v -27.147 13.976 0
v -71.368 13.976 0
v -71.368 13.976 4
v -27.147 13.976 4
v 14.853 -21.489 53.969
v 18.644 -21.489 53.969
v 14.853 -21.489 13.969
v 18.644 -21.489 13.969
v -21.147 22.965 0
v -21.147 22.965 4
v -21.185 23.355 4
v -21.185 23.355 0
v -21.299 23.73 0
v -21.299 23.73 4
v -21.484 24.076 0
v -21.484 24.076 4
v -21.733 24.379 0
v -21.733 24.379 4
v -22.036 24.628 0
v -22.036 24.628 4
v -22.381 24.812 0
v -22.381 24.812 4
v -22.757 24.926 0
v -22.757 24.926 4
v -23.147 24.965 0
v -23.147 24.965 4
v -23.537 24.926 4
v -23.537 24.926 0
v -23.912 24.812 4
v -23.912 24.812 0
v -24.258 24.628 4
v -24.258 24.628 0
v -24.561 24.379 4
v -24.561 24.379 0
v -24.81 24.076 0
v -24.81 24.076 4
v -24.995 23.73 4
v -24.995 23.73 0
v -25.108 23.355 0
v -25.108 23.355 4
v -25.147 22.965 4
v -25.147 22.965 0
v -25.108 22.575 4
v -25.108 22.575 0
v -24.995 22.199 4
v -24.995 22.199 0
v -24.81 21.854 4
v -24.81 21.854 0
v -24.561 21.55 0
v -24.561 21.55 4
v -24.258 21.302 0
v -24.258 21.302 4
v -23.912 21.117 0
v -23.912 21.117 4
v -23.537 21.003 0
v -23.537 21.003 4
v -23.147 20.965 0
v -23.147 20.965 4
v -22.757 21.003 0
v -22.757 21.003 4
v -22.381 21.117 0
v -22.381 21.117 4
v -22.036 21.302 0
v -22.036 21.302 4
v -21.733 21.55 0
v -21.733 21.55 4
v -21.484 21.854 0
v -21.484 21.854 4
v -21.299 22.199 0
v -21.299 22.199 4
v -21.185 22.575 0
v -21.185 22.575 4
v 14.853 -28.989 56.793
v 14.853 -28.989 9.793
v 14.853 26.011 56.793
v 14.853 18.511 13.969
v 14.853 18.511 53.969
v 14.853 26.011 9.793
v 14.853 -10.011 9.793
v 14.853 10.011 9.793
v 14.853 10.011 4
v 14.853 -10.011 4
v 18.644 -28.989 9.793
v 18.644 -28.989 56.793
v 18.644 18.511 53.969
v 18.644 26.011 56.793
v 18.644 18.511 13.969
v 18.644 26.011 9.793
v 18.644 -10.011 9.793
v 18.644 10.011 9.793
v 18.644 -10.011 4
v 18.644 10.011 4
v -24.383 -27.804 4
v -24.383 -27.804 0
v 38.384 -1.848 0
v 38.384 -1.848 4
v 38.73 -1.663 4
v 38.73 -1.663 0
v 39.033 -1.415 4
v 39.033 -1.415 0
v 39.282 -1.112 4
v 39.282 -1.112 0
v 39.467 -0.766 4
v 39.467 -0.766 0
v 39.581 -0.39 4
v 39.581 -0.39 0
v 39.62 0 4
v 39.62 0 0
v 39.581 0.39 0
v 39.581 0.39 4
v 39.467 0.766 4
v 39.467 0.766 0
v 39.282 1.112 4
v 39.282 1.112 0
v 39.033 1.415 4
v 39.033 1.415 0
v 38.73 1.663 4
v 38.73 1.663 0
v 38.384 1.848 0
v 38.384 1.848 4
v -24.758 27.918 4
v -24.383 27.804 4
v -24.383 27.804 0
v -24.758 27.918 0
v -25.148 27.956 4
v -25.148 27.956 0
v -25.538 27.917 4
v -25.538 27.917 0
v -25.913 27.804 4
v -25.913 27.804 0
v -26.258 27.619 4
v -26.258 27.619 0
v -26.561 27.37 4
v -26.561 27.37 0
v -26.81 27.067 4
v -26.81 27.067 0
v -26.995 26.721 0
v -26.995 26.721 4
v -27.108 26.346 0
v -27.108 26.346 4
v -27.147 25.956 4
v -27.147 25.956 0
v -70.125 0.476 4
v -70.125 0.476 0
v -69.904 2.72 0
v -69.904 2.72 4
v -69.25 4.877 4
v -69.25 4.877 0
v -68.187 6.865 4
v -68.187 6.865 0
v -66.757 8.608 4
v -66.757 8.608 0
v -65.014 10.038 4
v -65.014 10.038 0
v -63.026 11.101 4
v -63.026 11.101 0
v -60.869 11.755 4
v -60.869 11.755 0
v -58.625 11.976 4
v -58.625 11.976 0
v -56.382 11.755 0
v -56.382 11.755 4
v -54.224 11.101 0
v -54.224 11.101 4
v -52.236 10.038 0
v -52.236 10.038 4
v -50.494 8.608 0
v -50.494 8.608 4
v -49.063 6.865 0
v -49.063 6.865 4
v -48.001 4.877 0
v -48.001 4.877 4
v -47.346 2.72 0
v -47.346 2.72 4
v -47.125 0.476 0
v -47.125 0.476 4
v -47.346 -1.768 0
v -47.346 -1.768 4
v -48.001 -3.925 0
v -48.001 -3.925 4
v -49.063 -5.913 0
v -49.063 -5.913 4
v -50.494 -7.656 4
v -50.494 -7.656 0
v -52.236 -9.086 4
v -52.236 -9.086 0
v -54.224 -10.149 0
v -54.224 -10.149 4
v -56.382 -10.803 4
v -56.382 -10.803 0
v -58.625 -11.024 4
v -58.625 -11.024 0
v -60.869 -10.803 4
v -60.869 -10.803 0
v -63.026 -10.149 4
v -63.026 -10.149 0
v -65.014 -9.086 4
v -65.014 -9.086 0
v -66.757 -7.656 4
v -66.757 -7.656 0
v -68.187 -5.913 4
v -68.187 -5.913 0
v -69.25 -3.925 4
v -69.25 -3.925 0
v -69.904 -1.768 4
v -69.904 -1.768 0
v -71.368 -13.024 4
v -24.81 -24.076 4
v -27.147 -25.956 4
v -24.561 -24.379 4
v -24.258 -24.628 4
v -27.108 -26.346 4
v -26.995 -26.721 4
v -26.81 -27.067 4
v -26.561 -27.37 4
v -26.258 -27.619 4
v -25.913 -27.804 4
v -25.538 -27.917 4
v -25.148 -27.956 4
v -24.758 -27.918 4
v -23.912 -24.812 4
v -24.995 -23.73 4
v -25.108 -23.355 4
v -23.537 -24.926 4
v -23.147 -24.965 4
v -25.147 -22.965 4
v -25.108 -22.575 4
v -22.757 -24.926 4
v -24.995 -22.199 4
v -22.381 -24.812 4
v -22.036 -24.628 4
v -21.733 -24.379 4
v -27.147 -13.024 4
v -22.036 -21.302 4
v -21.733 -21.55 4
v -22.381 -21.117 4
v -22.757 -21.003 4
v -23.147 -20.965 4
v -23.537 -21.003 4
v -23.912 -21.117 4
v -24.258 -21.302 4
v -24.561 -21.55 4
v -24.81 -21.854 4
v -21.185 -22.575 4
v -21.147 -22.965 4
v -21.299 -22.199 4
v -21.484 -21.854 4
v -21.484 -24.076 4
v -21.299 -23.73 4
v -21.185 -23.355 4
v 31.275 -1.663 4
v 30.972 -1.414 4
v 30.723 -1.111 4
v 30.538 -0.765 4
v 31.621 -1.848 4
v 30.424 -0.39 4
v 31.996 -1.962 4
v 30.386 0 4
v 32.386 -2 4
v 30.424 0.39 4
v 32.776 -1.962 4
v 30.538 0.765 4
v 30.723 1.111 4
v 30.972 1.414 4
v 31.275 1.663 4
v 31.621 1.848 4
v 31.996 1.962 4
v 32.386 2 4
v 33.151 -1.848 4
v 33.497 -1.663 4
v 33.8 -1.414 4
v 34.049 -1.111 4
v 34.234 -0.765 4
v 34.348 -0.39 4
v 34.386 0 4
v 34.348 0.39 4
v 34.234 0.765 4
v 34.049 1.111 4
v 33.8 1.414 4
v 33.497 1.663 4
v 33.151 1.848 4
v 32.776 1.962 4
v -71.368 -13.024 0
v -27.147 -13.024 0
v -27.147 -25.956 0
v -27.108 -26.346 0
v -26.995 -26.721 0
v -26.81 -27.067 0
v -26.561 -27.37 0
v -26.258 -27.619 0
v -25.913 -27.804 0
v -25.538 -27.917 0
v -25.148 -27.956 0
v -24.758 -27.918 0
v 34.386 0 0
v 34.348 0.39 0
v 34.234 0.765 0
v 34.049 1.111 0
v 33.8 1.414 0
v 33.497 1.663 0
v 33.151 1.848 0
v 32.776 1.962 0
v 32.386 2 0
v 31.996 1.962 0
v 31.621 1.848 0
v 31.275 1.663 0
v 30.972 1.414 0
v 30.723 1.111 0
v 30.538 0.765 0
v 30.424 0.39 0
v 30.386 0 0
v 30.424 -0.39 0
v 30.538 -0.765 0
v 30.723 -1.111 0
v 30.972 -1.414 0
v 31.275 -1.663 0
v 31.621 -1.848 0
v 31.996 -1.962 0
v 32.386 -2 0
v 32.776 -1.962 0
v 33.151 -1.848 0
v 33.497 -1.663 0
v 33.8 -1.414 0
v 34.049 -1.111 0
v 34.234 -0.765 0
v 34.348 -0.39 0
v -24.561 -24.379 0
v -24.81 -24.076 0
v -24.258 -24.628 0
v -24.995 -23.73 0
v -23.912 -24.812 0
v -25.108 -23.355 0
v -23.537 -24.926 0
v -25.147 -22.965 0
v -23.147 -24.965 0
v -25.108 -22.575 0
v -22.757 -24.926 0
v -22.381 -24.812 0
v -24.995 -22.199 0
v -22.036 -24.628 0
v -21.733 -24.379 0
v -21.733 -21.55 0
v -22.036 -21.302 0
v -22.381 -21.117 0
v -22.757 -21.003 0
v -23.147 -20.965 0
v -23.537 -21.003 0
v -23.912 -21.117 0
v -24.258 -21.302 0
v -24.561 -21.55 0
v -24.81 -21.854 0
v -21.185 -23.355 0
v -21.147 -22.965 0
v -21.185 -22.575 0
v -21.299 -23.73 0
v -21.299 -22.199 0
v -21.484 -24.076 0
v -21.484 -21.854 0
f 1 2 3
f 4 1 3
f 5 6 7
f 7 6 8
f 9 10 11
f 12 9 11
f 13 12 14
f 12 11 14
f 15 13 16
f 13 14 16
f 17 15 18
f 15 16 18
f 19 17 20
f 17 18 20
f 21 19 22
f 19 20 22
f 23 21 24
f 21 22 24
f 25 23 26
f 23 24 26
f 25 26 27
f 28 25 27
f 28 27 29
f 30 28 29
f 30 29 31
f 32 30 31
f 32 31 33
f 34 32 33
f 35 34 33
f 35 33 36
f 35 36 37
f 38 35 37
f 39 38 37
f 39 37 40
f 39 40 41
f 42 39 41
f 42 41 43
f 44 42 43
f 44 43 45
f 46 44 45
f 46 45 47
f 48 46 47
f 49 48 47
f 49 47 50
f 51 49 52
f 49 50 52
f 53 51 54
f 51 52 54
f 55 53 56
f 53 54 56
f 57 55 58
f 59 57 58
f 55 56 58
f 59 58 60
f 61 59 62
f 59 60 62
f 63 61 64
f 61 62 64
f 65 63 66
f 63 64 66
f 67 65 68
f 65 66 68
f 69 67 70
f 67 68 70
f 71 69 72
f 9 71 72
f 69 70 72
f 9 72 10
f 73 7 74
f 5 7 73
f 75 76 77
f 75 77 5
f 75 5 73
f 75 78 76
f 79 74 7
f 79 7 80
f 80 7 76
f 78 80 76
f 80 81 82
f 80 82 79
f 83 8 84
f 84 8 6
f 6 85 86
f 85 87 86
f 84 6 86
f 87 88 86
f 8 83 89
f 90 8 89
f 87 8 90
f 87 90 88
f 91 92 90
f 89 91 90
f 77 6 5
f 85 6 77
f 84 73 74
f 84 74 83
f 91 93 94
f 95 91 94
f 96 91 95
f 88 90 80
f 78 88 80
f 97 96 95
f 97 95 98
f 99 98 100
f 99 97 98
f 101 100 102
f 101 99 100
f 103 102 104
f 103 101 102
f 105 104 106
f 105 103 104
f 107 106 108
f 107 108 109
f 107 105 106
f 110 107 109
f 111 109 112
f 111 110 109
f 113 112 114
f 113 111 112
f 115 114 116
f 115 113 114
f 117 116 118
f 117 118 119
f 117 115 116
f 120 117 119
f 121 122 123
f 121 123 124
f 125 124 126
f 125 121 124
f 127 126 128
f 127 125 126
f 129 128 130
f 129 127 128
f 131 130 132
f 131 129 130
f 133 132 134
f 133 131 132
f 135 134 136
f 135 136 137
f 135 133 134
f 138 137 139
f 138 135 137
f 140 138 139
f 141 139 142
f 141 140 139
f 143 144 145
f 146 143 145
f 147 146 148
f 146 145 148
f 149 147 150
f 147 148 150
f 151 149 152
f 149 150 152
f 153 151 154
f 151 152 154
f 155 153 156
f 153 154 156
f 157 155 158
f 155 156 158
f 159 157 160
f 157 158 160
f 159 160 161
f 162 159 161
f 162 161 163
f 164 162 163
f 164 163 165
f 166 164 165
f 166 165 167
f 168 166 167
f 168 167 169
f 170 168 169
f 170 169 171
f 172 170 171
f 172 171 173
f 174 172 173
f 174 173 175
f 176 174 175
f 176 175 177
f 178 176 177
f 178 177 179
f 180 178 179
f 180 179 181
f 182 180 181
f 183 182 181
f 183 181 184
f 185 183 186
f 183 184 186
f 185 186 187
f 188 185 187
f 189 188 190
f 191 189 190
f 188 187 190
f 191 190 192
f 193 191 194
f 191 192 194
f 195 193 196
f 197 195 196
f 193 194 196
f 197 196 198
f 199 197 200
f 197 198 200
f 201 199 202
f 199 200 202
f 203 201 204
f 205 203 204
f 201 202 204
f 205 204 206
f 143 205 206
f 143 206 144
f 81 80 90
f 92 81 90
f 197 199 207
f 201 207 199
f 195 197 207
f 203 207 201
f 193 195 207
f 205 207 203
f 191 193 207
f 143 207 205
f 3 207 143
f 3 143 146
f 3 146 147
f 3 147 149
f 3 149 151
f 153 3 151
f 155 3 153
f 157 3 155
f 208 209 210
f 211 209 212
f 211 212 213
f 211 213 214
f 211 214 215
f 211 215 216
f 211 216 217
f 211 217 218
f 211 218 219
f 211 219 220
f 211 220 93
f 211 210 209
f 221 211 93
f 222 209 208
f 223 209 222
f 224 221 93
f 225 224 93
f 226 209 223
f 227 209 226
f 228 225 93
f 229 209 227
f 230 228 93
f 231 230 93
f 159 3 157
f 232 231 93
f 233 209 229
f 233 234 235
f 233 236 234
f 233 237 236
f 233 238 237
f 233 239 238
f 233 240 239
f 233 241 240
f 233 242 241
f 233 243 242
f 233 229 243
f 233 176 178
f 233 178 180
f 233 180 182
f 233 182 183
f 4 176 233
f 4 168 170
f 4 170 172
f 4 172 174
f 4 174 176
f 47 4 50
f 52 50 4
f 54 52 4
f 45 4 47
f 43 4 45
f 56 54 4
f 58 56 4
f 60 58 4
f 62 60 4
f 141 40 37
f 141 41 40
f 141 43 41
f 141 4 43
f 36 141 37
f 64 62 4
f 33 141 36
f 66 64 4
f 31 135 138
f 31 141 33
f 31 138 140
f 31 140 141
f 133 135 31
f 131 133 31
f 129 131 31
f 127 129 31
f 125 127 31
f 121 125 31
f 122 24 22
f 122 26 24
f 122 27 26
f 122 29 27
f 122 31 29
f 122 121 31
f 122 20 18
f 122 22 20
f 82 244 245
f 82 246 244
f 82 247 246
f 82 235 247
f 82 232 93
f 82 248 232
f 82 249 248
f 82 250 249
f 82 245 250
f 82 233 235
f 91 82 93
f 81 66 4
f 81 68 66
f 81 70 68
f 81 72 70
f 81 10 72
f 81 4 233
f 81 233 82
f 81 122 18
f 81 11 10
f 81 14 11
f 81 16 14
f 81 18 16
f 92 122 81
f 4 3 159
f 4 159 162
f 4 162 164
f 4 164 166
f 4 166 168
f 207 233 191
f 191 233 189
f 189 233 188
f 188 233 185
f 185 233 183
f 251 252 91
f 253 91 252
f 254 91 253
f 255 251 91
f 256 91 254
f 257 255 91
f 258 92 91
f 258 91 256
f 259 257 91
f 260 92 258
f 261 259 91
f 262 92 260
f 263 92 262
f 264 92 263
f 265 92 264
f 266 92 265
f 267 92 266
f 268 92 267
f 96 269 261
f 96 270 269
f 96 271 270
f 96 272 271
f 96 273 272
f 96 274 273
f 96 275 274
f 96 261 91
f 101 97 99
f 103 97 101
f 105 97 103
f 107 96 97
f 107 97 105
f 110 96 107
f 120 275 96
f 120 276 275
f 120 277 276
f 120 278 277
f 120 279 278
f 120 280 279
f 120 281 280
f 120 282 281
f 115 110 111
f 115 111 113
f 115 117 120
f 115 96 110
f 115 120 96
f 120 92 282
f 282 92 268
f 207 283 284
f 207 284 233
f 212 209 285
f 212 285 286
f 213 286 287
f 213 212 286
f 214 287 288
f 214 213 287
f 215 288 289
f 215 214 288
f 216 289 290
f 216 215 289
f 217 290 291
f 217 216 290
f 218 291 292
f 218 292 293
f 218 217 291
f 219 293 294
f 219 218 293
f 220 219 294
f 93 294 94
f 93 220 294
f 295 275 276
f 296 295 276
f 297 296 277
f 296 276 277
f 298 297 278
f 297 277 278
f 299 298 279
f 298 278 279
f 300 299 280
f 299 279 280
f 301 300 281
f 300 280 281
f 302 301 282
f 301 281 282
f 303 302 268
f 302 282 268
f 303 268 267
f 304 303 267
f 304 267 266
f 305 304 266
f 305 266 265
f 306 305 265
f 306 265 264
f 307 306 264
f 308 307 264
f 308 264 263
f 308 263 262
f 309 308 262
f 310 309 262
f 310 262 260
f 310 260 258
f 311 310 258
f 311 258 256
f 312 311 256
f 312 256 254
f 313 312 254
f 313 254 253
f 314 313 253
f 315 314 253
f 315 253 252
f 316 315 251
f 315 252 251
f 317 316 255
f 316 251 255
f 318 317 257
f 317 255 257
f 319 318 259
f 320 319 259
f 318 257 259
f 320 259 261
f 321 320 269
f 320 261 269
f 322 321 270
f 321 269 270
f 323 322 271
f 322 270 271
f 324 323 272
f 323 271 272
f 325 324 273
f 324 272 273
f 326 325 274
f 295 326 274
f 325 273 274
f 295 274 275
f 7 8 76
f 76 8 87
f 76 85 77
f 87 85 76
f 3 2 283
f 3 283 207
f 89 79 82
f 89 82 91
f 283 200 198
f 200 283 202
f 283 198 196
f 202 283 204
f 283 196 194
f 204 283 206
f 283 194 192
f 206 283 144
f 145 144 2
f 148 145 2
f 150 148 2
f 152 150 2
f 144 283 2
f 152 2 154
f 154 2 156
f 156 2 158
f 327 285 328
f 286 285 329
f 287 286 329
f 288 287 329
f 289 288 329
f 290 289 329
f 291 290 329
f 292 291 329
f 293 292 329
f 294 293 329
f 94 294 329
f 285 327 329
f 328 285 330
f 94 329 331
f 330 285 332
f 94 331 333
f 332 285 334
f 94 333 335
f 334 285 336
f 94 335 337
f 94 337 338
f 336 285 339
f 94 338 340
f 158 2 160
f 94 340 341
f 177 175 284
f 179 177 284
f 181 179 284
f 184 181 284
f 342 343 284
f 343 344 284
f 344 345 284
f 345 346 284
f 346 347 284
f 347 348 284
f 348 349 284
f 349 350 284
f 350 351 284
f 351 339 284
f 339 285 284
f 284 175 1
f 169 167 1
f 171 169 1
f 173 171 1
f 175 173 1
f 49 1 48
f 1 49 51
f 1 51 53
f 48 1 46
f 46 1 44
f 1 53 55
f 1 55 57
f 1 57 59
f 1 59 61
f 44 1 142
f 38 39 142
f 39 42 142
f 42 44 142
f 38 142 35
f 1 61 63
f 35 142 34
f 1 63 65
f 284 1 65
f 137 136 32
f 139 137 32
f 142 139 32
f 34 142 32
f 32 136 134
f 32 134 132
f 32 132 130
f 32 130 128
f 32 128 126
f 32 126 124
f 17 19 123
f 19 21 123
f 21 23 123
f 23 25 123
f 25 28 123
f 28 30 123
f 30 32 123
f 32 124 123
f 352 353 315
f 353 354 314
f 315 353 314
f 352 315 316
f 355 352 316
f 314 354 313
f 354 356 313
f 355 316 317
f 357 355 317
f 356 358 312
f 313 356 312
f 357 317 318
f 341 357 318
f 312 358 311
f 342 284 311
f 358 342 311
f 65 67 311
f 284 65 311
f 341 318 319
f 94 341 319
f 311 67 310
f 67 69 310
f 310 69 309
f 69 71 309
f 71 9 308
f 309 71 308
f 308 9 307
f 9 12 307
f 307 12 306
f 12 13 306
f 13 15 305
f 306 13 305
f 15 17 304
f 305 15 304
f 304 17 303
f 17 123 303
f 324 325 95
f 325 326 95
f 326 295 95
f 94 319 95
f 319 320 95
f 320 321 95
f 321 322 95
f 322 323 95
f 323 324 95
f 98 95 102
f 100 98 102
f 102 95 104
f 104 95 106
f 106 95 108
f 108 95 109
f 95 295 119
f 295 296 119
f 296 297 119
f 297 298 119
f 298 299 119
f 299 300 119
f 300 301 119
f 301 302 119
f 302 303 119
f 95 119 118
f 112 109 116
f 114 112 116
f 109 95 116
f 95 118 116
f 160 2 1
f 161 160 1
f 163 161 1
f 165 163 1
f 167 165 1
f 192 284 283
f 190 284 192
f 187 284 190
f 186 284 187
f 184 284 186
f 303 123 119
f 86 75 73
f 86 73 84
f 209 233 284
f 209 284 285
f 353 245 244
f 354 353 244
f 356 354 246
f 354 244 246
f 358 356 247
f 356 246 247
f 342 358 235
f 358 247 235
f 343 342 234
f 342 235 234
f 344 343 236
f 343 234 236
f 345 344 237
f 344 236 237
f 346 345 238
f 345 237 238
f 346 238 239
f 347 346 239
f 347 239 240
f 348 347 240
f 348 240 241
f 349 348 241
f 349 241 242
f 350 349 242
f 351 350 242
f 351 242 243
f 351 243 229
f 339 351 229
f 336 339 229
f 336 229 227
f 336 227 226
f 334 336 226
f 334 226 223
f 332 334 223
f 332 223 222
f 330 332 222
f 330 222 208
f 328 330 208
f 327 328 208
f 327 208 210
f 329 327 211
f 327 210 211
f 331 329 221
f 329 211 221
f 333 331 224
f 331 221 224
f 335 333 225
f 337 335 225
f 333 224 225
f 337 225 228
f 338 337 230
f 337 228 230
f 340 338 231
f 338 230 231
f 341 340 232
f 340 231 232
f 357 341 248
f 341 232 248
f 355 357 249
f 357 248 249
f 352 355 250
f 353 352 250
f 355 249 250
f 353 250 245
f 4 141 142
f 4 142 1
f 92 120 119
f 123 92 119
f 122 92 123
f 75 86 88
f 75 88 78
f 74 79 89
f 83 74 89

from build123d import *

# Parameters (mm, degrees)
Y_KSEKLIK_EKSTR_ZYON1_DEPTH = 4
IZIM2_W                     = 4
IZIM2_H                     = 27
Y_KSEKLIK_EKSTR_ZYON2_DEPTH = 44.221383782
Y_KSEKLIK_EKSTR_ZYON3_REACH = 97.396
IZIM3_W                     = 3.790620303
IZIM3_H                     = 20.022795238
IZIM4_W                     = 3.790620303
IZIM4_H                     = 47
Y_KSEKLIK_EKSTR_ZYON4_DEPTH = 16
IZIM5_W                     = 3.790620303
IZIM5_H                     = 47
Y_KSEKLIK_EKSTR_ZYON5_DEPTH = 18.977204763
IZIM6_W                     = 40
IZIM6_H                     = 40
KES_EKSTR_ZYON1_DEPTH       = 111.308229444
F_23_0_23_AP_DELIK1_D       = 23
F_4_0_4_AP_DELIK1_D         = 4
F_4_0_4_AP_DELIK1_DEPTH     = 56.792653887


with BuildPart() as part:
    # Çizim1 → Yükseklik-Ekstrüzyon1 (new body)
    with BuildSketch(Plane.XY.offset(4)):
        with BuildLine():
            Line((-27.146814404, 25.956036228), (-27.146814404, -25.956036228))
            ThreePointArc((-27.146814404, -25.956036228), (-26.258437345, -27.618652972), (-24.382519966, -27.804239142))
            Line((-24.382519966, -27.804239142), (38.383894912, -1.848202914))
            ThreePointArc((38.383894912, -1.848202914), (39.619600474, 0), (38.383894912, 1.848202914))
            Line((38.383894912, 1.848202914), (-24.382519966, 27.804239142))
            ThreePointArc((-24.382519966, 27.804239142), (-26.258437345, 27.618652972), (-27.146814404, 25.956036228))
        make_face()
    extrude(amount=-Y_KSEKLIK_EKSTR_ZYON1_DEPTH)

    # Çizim2 → Yükseklik-Ekstrüzyon2 (add)
    with BuildSketch(Plane.ZY.offset(27.146814404)):
        with Locations((2, 0.476036228)):
            Rectangle(IZIM2_W, IZIM2_H)
    extrude(amount=Y_KSEKLIK_EKSTR_ZYON2_DEPTH)

    # Çizim3 → Yükseklik-Ekstrüzyon3 (add, up to next)
    with BuildSketch(Plane.XY.offset(56.792653887), mode=Mode.PRIVATE) as y_kseklik_ekstr_zyon3_sk1:
        with Locations((16.748495748, 0)):
            Rectangle(IZIM3_W, IZIM3_H)
    y_kseklik_ekstr_zyon3_tool1 = extrude(y_kseklik_ekstr_zyon3_sk1.sketch, amount=-Y_KSEKLIK_EKSTR_ZYON3_REACH, mode=Mode.PRIVATE) - part.part
    add(y_kseklik_ekstr_zyon3_tool1.solids().sort_by_distance((16.748496, 0, 56.792654))[0])

    # Çizim4 → Yükseklik-Ekstrüzyon4 (add)
    with BuildSketch(Plane(origin=(0, 10.011397619, 0), x_dir=(-1, 0, 0), z_dir=(0, 1, 0))):
        with Locations((-16.748495748, 33.292653887)):
            Rectangle(IZIM4_W, IZIM4_H)
    extrude(amount=Y_KSEKLIK_EKSTR_ZYON4_DEPTH)

    # Çizim5 → Yükseklik-Ekstrüzyon5 (add)
    with BuildSketch(Plane.XZ.offset(10.011397619)):
        with Locations((16.748495748, 33.292653887)):
            Rectangle(IZIM5_W, IZIM5_H)
    extrude(amount=Y_KSEKLIK_EKSTR_ZYON5_DEPTH)

    # Çizim6 → Kes-Ekstrüzyon1 (cut, through all)
    with BuildSketch(Plane(origin=(18.643805899, 0, 0), x_dir=(0, 0, -1), z_dir=(1, 0, 0))):
        with Locations((-33.968638069, -1.488602381)):
            Rectangle(IZIM6_W, IZIM6_H)
    extrude(amount=-KES_EKSTR_ZYON1_DEPTH, mode=Mode.SUBTRACT)

    # Ø23.0 (23) Çap Delik1 (through all)
    with Locations(Plane.XY.offset(4)):
        with Locations((-58.625359309, 0.476036228)):
            Hole(F_23_0_23_AP_DELIK1_D / 2)

    # Ø4.0 (4) Çap Delik1
    with Locations(Plane(origin=(0, 0, 0), x_dir=(-1, 0, 0), z_dir=(0, 0, -1))):
        with Locations((23.146814404, -22.964704035), (23.146814404, 22.964704035), (-32.386015353, 0)):
            Hole(F_4_0_4_AP_DELIK1_D / 2, depth=F_4_0_4_AP_DELIK1_DEPTH)


solid = part.part
